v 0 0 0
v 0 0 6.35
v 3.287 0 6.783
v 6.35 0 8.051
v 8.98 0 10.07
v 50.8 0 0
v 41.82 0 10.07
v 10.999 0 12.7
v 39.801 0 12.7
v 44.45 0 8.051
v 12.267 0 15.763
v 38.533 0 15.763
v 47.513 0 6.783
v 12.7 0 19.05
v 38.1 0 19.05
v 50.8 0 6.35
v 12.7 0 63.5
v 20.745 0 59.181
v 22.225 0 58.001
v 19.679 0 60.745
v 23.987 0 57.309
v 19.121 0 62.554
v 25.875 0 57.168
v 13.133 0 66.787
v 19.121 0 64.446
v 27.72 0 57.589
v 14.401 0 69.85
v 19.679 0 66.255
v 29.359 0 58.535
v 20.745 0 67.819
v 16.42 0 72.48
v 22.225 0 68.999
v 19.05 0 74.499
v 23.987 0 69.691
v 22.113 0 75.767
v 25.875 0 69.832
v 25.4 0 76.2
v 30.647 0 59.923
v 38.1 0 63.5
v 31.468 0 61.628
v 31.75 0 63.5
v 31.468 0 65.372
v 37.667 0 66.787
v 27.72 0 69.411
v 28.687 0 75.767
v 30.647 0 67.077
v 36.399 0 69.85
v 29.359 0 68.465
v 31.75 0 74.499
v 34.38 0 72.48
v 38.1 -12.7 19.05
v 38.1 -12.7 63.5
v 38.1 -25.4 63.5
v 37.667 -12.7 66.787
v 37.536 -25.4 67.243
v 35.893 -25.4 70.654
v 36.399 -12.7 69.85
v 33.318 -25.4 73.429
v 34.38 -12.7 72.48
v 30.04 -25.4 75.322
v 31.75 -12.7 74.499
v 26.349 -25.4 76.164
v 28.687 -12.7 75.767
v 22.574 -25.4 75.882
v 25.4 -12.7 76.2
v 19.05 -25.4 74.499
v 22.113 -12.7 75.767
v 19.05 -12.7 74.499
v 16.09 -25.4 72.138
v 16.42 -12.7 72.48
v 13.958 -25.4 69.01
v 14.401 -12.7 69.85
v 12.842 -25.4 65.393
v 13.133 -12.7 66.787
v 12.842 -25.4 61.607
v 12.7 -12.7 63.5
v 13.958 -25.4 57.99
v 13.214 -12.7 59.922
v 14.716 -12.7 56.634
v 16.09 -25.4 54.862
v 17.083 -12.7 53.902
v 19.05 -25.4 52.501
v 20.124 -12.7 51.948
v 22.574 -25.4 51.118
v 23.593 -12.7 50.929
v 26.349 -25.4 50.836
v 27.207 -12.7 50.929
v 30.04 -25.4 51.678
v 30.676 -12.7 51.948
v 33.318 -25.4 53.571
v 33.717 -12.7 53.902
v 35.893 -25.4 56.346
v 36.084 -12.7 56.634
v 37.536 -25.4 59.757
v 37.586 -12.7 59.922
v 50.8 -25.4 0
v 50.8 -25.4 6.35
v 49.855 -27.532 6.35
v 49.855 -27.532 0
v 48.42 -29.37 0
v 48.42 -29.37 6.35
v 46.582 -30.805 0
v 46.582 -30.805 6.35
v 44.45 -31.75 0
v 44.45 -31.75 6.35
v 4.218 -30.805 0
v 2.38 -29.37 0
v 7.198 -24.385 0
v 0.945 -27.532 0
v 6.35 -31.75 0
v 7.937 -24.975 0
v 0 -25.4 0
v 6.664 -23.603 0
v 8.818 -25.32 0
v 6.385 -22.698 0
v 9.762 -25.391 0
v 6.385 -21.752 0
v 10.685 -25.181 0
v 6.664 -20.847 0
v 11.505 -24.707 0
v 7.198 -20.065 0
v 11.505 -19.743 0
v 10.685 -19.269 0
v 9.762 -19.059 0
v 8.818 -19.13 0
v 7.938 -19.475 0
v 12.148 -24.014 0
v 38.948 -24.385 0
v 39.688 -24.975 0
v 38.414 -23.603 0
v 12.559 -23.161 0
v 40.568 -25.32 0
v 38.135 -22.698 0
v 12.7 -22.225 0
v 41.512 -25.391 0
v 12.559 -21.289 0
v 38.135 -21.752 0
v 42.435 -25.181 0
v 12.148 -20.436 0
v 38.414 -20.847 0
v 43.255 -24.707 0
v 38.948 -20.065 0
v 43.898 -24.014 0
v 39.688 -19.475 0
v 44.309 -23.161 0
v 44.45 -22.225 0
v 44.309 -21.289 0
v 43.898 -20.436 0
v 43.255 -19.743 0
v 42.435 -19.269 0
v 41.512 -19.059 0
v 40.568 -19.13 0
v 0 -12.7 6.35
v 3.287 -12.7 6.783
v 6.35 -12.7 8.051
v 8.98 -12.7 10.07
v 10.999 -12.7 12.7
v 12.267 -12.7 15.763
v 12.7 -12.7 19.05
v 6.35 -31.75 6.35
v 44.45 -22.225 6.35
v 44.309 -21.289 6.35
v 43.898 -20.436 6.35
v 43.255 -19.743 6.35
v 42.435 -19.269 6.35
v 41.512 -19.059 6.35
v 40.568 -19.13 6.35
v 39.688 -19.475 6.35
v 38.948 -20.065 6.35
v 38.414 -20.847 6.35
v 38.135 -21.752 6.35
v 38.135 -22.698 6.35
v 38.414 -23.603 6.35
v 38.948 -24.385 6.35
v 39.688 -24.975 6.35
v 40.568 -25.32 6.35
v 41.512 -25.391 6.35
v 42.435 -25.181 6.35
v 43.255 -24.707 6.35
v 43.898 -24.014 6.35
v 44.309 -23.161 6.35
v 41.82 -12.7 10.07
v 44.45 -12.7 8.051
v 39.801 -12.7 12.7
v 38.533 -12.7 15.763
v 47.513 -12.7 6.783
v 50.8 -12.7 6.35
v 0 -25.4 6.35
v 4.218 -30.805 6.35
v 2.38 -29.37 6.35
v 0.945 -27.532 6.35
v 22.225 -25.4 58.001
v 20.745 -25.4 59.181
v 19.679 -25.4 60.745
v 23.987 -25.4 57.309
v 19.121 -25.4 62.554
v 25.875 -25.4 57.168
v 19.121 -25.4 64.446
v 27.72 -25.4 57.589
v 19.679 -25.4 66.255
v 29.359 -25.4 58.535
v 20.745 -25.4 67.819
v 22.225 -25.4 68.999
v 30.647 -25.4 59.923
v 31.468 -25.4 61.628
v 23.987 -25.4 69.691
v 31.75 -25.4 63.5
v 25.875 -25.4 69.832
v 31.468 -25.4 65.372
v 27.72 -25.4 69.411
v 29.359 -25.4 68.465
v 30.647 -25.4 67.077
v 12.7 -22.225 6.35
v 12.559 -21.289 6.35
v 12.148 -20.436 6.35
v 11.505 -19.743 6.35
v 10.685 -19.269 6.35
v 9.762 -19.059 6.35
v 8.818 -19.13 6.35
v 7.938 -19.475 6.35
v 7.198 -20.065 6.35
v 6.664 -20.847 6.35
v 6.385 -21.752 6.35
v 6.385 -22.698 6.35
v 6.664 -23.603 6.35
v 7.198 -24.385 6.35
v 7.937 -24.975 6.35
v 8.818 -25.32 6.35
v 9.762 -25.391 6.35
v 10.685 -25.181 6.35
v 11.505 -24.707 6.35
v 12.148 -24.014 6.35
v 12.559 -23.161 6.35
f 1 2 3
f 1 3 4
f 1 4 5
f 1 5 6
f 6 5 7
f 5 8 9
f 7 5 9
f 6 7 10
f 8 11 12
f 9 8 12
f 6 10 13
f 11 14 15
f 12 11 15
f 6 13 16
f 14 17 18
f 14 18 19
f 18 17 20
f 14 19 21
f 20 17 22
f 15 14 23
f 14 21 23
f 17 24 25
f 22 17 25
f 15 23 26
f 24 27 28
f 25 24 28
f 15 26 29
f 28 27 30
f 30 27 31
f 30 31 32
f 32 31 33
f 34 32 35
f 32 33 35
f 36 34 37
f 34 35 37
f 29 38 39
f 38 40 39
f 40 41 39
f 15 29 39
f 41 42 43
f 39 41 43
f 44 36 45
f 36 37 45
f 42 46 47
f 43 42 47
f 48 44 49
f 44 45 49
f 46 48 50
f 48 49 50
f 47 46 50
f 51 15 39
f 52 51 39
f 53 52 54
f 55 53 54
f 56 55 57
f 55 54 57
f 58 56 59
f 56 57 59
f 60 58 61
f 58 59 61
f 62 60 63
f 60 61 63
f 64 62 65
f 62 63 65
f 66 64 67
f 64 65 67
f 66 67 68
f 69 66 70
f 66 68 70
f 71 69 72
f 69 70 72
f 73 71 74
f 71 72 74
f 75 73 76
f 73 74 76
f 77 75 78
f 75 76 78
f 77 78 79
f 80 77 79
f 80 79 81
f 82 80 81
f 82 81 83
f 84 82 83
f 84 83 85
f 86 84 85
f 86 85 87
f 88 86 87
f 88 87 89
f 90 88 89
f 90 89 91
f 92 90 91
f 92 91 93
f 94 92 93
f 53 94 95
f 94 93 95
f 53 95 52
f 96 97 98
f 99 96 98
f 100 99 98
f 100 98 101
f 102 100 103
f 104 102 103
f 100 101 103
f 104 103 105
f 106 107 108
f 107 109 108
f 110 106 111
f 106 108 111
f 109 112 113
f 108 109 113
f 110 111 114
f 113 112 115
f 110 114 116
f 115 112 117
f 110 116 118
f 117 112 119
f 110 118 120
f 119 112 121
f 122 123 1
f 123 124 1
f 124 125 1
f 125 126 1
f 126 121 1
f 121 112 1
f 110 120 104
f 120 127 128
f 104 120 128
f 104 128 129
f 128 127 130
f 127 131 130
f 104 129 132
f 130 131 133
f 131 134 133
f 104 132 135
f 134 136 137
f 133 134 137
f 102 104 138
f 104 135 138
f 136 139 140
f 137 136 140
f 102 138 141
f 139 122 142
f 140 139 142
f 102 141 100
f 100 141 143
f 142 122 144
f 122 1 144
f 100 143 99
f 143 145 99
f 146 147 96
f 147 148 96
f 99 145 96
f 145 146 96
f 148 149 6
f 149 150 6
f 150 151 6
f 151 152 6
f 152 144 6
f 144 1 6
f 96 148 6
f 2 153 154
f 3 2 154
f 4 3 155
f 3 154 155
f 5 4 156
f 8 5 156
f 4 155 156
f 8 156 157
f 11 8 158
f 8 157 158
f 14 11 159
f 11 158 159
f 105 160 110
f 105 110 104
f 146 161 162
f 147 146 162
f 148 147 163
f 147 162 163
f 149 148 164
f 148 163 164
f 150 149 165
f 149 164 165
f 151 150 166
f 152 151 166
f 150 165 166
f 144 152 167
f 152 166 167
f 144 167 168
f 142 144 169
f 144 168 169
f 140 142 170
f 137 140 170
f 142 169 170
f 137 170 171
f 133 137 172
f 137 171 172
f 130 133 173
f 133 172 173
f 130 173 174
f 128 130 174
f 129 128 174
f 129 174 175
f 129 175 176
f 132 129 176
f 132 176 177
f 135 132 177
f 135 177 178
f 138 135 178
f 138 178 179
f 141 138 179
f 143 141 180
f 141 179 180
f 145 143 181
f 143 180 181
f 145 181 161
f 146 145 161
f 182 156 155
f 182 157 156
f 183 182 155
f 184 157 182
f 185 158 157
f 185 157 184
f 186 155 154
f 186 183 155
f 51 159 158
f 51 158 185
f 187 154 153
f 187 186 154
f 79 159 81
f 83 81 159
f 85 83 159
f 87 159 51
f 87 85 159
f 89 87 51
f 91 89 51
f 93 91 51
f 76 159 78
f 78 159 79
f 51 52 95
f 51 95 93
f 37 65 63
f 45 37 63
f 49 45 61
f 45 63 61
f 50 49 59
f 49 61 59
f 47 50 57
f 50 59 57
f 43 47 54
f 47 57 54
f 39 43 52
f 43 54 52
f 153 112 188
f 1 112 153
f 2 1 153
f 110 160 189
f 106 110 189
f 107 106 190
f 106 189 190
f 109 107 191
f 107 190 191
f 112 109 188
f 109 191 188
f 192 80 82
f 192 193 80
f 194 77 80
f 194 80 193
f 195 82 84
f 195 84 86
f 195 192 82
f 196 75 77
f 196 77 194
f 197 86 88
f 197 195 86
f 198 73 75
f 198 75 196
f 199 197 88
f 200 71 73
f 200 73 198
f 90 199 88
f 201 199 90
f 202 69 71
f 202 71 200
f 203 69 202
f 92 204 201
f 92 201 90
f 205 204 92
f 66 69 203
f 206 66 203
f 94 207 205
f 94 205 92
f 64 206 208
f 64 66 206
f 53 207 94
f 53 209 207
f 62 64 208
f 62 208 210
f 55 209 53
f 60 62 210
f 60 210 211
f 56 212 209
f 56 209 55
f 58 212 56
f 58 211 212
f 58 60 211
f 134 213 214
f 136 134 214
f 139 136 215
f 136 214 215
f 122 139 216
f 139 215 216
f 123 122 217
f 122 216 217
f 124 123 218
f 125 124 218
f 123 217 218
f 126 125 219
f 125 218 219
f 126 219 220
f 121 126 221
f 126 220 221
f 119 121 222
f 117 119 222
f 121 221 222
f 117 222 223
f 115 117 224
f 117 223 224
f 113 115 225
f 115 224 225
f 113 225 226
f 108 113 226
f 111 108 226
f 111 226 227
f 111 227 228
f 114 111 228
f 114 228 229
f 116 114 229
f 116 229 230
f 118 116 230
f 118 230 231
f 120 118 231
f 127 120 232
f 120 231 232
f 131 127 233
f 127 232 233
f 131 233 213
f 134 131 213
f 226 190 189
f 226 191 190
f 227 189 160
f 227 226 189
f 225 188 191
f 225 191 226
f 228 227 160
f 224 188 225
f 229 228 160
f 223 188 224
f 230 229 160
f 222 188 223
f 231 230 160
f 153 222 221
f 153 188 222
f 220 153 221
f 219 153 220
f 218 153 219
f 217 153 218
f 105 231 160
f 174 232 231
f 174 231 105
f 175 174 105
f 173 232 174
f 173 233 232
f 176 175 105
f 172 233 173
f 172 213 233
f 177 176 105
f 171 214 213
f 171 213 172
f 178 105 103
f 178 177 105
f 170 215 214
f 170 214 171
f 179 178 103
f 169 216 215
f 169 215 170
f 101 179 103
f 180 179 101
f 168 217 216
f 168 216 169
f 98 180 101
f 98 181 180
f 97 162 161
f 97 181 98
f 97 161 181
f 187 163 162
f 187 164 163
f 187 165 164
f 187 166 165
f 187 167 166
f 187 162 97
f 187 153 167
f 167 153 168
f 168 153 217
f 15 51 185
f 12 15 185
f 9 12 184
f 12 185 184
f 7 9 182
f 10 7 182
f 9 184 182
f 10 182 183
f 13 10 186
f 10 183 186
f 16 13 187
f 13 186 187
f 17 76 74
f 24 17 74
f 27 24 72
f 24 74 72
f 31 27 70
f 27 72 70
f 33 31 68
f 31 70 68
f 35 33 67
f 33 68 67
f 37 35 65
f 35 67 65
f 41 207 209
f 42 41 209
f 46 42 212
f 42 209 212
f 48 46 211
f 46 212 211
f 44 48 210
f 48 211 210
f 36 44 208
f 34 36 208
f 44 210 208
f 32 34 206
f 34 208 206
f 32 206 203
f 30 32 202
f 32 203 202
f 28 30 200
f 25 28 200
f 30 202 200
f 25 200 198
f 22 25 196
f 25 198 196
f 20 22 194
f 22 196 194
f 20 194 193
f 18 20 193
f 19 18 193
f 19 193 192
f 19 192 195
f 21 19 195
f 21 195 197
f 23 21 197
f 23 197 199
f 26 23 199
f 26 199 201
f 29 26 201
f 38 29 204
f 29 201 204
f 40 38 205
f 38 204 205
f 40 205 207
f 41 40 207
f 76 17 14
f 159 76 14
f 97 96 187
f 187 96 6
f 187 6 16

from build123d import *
from build123d import SkipClean  # not in build123d's __all__

# Parameters (mm, degrees)
F1_DEPTH  = 12.7
F2_W      = 50.8
F2_H      = 6.35
F3_DEPTH  = 19.05
F5_DEPTH  = 12.7
F7_R      = 12.7
F8_DEPTH  = 25.4
F9_R      = 6.35
F10_DEPTH = 25.4
F11_R     = 3.175
F12_DEPTH = 6.35


with BuildPart() as f1:
    # F0 (on Front) → F1 (new body)
    with BuildSketch(Plane.XZ):
        Polygon((0, 19.05), (0, 0), (50.8, 0), (50.8, 19.05), (38.1, 19.05), (38.1, 76.2), (12.7, 76.2), (12.7, 19.05), align=None)
    extrude(amount=F1_DEPTH)

    # F2 (on face) → F3 (join)
    with BuildSketch(Plane.XZ.offset(12.7)):
        with Locations((25.4, 3.175)):
            Rectangle(F2_W, F2_H)
    extrude(amount=F3_DEPTH)

    # F4 (on face) → F5 (cut)
    with BuildSketch(Plane.XZ.offset(12.7)):
        with BuildLine():
            Line((0, 19.05), (0, 6.35))
            ThreePointArc((0, 6.35), (8.9802561211, 10.0697438789), (12.7, 19.05))
            Line((12.7, 19.05), (0, 19.05))
        make_face()
        with BuildLine():
            Line((50.8, 19.05), (38.1, 19.05))
            ThreePointArc((38.1, 19.05), (41.8197438789, 10.0697438789), (50.8, 6.35))
            Line((50.8, 6.35), (50.8, 19.05))
        make_face()
    extrude(amount=-F5_DEPTH, mode=Mode.SUBTRACT)

    # F7 (on Front) → F8 (join)
    with BuildSketch(Plane.XZ):
        with Locations((25.4, 63.5)):
            Circle(F7_R)
    extrude(amount=F8_DEPTH)

    # F9 (on face) + F8_face1 (on face) → F10 (cut)
    with BuildSketch(Plane.XZ.offset(25.4)):
        with Locations((25.4, 63.5)):
            Circle(F9_R)
    with BuildSketch(Plane(origin=(35.2632271754, -12.7, 73.3632271754), x_dir=(1, 0, 0), z_dir=(0, -1, 0))):
        with BuildLine():
            Line((2.8367728246, -9.8632271754), (2.8367728246, 2.8367728246))
            Line((2.8367728246, 2.8367728246), (-9.8632271754, 2.8367728246))
            ThreePointArc((-9.8632271754, 2.8367728246), (-0.8829710543, -0.8829710543), (2.8367728246, -9.8632271754))
        make_face()
        with BuildLine():
            ThreePointArc((-22.5632271754, -9.8632271754), (-18.8434832965, -0.8829710543), (-9.8632271754, 2.8367728246))
            Line((-9.8632271754, 2.8367728246), (-22.5632271754, 2.8367728246))
            Line((-22.5632271754, 2.8367728246), (-22.5632271754, -9.8632271754))
        make_face()
    with SkipClean():  # cleaning this boolean's faces spoils the solid; the shape is the same uncleaned
        extrude(amount=-F10_DEPTH, mode=Mode.SUBTRACT)

    # F6 (on face) + F11 (on face) → F12 (cut)
    with BuildSketch(Plane.XY.offset(6.35)):
        with BuildLine():
            Line((0, -31.75), (6.35, -31.75))
            ThreePointArc((6.35, -31.75), (2.3796890107, -29.3703109893), (0, -25.4))
            Line((0, -25.4), (0, -31.75))
        make_face()
        with BuildLine():
            ThreePointArc((50.8, -25.4), (48.4203109893, -29.3703109893), (44.45, -31.75))
            Line((44.45, -31.75), (50.8, -31.75))
            Line((50.8, -31.75), (50.8, -25.4))
        make_face()
    with BuildSketch(Plane.XY.offset(6.35)):
        with Locations((9.525, -22.225)):
            Circle(F11_R)
        with Locations((41.275, -22.225)):
            Circle(F11_R)
    with SkipClean():  # cleaning this boolean's faces spoils the solid; the shape is the same uncleaned
        extrude(amount=-F12_DEPTH, mode=Mode.SUBTRACT)


solid = f1.part
